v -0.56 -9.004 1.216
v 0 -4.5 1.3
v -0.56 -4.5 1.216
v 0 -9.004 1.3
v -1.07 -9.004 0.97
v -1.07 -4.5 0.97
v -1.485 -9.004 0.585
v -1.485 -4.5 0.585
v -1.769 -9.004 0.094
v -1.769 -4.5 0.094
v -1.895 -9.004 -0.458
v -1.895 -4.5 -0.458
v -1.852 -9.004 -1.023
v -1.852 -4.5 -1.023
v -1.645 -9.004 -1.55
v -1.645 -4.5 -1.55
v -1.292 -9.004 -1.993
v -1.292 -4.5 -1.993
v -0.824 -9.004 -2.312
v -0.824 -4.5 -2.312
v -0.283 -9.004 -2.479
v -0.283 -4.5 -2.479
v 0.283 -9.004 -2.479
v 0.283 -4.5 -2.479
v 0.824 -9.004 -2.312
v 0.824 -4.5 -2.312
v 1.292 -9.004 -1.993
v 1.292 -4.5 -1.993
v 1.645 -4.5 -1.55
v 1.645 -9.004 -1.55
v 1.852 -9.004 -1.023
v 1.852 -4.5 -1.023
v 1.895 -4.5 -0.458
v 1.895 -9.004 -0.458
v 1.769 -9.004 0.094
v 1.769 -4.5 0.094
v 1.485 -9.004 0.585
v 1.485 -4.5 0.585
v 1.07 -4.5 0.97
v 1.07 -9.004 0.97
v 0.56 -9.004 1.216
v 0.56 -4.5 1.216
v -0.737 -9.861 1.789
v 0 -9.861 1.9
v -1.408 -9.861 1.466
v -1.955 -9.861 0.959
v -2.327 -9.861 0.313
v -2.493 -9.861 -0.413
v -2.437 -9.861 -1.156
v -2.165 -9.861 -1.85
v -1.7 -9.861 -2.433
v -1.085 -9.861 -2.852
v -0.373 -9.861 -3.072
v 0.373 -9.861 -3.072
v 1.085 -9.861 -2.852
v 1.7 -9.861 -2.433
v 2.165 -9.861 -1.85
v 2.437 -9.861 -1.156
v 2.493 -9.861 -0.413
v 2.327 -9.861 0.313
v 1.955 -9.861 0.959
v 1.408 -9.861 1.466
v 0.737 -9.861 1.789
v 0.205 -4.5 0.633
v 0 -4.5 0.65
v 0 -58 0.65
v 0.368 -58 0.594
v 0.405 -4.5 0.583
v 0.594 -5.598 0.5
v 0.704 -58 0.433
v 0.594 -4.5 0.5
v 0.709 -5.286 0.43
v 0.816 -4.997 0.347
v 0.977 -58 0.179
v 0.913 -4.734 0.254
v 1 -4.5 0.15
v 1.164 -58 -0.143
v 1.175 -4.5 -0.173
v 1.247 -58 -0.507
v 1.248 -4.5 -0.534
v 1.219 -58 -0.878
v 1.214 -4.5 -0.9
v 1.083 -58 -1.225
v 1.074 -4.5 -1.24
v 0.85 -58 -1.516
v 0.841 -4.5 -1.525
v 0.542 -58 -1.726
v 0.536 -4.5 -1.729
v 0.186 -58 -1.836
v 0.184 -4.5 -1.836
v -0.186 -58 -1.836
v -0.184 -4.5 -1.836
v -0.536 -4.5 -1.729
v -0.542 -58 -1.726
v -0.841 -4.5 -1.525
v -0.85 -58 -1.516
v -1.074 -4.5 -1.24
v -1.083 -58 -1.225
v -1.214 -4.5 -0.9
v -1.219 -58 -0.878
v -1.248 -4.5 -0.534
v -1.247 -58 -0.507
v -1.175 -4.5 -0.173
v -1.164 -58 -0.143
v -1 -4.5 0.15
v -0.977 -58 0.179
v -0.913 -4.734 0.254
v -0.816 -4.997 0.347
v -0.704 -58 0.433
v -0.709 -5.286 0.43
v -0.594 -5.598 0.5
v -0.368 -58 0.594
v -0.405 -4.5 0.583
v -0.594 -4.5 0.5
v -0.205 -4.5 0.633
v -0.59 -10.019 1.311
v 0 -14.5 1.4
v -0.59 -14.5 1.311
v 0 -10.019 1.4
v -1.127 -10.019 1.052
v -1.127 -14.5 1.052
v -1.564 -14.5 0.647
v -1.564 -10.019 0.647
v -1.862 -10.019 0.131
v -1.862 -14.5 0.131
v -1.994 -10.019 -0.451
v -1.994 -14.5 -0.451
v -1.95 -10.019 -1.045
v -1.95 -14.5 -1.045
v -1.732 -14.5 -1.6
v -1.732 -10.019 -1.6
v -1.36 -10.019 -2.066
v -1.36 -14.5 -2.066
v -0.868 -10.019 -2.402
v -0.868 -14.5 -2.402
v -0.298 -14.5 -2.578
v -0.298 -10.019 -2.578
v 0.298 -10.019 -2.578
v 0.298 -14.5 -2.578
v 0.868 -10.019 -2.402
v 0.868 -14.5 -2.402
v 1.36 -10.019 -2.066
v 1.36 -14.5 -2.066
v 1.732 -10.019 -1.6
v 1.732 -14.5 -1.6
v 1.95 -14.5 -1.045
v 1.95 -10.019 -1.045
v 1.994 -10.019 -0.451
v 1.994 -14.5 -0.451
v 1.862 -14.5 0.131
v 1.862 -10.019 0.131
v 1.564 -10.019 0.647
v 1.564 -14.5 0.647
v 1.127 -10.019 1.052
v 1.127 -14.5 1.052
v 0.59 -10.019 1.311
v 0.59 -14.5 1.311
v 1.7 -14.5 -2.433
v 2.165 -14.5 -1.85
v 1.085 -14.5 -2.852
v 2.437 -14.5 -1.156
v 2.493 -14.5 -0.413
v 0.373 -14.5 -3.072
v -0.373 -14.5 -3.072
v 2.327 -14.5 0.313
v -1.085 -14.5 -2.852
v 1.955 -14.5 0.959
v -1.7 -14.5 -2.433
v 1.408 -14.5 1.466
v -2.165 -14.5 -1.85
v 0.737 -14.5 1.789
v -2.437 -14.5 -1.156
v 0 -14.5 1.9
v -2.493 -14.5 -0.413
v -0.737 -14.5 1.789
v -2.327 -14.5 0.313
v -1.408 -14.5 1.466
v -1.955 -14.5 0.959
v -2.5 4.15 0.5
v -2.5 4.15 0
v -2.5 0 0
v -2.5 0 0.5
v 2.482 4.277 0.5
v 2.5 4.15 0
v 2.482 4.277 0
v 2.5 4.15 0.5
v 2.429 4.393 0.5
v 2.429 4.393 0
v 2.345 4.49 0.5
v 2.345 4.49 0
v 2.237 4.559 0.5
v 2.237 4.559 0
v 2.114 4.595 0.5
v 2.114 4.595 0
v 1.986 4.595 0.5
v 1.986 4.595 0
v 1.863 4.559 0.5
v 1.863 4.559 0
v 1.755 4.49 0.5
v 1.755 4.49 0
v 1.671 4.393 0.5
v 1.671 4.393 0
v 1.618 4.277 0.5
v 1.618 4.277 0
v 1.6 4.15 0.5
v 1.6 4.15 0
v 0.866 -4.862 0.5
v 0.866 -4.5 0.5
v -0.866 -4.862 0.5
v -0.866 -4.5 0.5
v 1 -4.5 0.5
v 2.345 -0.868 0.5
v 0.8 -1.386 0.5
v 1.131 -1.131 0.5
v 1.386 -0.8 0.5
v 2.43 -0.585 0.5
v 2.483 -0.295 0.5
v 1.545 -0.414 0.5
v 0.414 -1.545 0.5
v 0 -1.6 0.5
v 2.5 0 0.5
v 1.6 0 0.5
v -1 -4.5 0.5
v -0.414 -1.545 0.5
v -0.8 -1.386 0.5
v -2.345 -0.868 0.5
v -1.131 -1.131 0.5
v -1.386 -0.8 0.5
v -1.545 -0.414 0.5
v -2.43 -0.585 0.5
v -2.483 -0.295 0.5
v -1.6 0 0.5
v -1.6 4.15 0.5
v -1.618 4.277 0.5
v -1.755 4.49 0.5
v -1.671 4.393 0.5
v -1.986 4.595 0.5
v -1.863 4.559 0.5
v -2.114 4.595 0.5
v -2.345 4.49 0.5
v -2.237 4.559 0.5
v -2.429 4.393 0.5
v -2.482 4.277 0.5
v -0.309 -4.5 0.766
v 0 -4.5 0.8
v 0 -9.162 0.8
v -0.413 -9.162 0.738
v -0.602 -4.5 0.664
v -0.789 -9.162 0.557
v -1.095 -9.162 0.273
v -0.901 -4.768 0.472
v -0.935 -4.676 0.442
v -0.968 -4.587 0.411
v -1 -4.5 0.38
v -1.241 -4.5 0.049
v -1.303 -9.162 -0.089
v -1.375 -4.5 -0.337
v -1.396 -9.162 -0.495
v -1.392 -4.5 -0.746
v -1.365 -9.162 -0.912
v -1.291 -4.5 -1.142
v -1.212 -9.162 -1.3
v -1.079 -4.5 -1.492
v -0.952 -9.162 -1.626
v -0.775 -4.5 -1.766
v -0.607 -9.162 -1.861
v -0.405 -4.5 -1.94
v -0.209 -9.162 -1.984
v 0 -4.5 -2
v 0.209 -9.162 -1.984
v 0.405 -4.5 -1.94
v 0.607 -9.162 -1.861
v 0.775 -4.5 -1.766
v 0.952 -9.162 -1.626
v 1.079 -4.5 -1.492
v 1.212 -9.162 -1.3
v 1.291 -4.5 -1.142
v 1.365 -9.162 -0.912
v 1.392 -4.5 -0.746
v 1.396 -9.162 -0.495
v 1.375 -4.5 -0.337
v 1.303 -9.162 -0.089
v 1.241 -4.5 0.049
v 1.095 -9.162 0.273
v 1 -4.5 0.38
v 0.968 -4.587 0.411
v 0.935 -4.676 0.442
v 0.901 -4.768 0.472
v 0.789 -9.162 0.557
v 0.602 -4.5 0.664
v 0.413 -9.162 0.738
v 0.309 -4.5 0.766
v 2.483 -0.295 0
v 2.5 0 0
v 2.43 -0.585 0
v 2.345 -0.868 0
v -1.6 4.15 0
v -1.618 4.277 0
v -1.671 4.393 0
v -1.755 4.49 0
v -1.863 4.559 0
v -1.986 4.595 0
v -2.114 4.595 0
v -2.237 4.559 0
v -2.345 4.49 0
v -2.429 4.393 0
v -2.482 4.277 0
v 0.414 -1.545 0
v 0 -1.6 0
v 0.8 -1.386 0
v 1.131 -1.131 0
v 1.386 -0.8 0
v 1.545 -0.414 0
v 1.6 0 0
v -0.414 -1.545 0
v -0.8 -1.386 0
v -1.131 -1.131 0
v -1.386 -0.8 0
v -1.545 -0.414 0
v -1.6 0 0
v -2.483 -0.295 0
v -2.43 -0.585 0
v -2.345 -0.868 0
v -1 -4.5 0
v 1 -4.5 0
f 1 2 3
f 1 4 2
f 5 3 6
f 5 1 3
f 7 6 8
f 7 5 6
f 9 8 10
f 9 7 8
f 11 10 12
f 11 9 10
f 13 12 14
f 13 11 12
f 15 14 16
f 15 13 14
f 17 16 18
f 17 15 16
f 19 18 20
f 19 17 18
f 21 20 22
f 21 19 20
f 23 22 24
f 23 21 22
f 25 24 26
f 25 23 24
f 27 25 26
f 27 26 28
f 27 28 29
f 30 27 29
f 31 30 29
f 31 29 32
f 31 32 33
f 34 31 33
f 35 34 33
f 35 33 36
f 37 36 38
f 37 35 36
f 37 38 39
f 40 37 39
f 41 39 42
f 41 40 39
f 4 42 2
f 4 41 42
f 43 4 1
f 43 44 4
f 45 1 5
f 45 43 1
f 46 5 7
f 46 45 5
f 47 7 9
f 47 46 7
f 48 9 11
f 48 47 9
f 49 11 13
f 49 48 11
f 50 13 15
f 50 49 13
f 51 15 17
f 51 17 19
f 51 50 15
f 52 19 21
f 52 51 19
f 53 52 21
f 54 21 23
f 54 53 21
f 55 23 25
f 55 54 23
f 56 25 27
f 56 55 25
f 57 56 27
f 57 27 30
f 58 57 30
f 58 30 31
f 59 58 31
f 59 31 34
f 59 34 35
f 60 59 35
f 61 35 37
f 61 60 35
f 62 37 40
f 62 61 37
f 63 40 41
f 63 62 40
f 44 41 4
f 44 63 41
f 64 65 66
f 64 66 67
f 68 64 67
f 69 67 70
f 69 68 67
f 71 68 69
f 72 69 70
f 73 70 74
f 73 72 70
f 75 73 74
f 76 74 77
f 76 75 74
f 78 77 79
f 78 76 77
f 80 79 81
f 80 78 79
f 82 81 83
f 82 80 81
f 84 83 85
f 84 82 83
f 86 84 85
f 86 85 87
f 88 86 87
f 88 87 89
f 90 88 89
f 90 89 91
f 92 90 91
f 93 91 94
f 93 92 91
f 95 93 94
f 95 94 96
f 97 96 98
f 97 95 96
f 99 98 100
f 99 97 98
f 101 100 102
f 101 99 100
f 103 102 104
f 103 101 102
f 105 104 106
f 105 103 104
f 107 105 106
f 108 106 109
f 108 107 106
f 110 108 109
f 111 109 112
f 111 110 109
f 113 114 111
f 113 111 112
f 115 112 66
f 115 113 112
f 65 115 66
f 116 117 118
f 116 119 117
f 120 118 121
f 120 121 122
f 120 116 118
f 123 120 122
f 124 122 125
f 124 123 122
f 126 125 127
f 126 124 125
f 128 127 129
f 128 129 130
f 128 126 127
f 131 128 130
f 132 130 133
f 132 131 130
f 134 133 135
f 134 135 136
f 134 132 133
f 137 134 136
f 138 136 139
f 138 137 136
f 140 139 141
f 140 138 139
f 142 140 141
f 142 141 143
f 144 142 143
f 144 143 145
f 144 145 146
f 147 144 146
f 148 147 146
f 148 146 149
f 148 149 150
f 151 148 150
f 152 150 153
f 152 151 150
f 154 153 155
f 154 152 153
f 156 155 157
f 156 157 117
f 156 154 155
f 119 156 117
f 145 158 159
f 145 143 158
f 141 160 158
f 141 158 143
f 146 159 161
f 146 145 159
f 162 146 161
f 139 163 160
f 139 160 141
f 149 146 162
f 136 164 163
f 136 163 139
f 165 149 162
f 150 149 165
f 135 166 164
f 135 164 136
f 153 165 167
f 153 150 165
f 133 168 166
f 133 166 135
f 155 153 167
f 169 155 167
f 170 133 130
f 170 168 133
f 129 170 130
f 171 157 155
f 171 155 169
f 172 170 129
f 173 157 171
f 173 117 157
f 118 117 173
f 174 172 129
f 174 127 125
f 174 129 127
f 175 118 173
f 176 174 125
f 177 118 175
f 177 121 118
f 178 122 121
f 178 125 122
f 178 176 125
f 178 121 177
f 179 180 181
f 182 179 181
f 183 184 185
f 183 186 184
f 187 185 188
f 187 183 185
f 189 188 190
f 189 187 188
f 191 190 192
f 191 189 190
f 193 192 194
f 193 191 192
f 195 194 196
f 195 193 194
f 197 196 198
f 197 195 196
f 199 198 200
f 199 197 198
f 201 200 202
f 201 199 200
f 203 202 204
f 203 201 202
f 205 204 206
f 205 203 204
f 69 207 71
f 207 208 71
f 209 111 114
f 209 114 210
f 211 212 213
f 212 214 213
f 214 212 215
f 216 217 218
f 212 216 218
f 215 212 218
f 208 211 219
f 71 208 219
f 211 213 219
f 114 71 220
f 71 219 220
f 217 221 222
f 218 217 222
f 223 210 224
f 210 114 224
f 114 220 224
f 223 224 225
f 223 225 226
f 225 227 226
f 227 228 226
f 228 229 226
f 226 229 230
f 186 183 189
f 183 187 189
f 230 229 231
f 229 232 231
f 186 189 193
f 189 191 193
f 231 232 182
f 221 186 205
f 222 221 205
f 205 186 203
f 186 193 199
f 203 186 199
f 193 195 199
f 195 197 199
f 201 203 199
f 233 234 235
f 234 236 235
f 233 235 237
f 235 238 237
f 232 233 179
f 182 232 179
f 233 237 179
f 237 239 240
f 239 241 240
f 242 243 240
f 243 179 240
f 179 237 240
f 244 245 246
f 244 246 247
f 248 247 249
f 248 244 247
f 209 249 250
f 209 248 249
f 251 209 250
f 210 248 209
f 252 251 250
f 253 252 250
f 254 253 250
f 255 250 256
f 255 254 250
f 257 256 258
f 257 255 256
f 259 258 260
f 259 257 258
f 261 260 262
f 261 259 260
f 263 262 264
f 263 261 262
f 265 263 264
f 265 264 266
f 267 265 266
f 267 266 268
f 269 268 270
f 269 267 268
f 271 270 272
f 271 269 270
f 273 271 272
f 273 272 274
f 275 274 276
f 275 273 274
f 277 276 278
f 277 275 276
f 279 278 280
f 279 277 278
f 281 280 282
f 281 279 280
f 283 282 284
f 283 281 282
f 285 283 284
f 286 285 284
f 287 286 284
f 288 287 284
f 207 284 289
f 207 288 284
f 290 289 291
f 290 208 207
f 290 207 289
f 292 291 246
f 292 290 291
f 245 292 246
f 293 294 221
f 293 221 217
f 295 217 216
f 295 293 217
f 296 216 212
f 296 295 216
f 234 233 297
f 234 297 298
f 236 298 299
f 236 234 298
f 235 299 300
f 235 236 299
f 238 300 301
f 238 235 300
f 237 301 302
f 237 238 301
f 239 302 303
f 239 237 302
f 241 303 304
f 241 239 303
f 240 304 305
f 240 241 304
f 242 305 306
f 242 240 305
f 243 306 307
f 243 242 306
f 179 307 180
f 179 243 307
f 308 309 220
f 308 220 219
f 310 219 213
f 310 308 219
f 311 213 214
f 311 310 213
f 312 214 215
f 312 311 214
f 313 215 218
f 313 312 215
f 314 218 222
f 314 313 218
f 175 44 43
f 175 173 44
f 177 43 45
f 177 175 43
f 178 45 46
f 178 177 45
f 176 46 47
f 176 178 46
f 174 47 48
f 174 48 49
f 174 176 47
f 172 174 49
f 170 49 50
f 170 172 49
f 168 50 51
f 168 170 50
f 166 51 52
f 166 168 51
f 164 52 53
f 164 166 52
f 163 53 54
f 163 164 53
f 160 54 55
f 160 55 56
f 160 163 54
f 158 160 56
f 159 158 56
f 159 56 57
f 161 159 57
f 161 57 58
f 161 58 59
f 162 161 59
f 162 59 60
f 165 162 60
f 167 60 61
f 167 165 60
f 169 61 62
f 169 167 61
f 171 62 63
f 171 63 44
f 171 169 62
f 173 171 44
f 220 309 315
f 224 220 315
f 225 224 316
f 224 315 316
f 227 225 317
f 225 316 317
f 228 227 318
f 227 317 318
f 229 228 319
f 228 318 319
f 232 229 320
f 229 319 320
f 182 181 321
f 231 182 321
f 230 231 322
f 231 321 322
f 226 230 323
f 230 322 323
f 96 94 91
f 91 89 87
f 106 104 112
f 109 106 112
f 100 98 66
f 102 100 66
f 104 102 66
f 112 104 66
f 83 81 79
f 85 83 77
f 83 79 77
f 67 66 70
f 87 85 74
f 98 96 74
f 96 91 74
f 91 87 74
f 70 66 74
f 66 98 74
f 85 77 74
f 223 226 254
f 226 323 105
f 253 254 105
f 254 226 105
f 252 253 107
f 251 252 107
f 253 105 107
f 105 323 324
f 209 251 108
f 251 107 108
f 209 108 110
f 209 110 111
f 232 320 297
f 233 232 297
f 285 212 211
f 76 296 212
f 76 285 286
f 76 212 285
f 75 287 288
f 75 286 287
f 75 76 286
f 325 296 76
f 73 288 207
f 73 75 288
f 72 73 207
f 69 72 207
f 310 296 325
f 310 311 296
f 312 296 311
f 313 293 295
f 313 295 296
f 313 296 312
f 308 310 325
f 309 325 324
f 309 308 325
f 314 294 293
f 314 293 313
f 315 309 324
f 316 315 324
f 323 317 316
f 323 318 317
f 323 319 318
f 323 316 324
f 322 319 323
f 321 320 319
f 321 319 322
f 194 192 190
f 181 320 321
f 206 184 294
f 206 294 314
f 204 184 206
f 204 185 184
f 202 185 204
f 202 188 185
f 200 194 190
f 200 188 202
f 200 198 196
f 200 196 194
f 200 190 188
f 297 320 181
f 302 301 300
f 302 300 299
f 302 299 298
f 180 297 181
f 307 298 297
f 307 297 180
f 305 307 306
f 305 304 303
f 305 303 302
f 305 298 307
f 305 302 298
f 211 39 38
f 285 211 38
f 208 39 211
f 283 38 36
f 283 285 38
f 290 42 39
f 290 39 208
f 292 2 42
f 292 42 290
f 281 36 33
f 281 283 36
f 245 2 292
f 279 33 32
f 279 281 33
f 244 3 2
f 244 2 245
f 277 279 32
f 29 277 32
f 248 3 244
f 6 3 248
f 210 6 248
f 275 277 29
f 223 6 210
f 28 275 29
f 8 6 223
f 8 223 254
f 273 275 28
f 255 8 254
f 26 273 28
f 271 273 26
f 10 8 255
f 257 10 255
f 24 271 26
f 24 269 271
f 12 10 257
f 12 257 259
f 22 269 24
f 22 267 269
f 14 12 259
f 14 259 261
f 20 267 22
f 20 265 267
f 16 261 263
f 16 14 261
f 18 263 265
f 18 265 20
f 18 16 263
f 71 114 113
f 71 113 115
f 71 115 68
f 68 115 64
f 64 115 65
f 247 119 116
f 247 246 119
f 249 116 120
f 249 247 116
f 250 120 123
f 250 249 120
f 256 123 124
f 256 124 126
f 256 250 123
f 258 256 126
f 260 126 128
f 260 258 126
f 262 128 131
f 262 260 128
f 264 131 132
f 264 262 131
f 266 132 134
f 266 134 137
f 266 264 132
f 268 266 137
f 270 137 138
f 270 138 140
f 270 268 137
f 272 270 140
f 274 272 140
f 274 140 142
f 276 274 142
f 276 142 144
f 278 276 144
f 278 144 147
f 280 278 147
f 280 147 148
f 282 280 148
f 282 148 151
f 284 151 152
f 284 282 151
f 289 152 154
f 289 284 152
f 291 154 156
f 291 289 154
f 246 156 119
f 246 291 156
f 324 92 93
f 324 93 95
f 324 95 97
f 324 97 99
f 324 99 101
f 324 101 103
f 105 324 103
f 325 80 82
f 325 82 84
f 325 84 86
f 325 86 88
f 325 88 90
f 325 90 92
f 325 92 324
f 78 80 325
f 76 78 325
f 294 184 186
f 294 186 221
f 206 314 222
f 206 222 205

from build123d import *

# Parameters (mm, degrees)
EXTRUDE_1_DEPTH               = 0.5
FILLET_1_RADIUS               = 0.45
FILLET_1_LENGTH               = 0.5
CHAMFER_1_SIZE                = 0.5
FILLET_1_OF_MIRROR_1_2_RADIUS = 0.45
FILLET_1_OF_MIRROR_1_2_LENGTH = 0.5
CHAMFER_1_OF_MIRROR_1_SIZE    = 0.5
SKETCH_5_R                    = 1.25
EXTRUDE_2_DEPTH               = 53.5


with BuildPart() as part:
    # 草图1 → 凸台-拉伸1 (new body)
    with BuildSketch(Plane.XY):
        with BuildLine():
            Line((-2.344520595, -0.867884312), (-1, -4.5))
            Line((-1, -4.5), (-1, -14.5))
            Line((-1, -14.5), (0, -14.5))
            Line((0, -14.5), (0, -1.6))
            ThreePointArc((0, -1.6), (-1.13137085, -1.13137085), (-1.6, 0))
            Line((-1.6, 0), (-1.6, 4.6))
            Line((-1.6, 4.6), (-2.5, 4.6))
            Line((-2.5, 4.6), (-2.5, 0))
            ThreePointArc((-2.5, 0), (-2.460823184, -0.440850605), (-2.344520595, -0.867884312))
        make_face()
    extrude_1 = extrude(amount=EXTRUDE_1_DEPTH)

    # 圆角1: full round fillet: the end face becomes a half cylinder, R = half its width
    fillet_1_face = Plane((-2.05, 4.6, 0.25), x_dir=(0, 0, 1), z_dir=(0, 1, 0))  # on the end face: x along it, z out of the body
    fillet_1_slab = fillet_1_face.offset(-FILLET_1_RADIUS / 2) * Box(FILLET_1_LENGTH, 2 * FILLET_1_RADIUS, FILLET_1_RADIUS, mode=Mode.PRIVATE)  # the body's end, R deep
    fillet_1_round = Plane((-2.05, 4.15, 0.25), x_dir=(0, 1, 0), z_dir=(0, 0, 1)) * Cylinder(FILLET_1_RADIUS, FILLET_1_LENGTH, mode=Mode.PRIVATE)  # its axis R under the face
    add(fillet_1_slab - fillet_1_round, mode=Mode.SUBTRACT)

    # 倒角1
    chamfer_1_edges = [part.edges().sort_by_distance(p)[0] for p in [
        (-1, -9.5, 0.5),
    ]]
    chamfer(chamfer_1_edges, length=CHAMFER_1_SIZE - 0.0001)  # a hair under: the kernel refuses the full size

    # 镜向1: 凸台-拉伸1 across Right Plane
    add(extrude_1.mirror(Plane(origin=(0, 0, 0), x_dir=(0, 0, -1), z_dir=(1, 0, 0))))

    # 圆角1 of Mirror 1 2: full round fillet: the end face becomes a half cylinder, R = half its width
    fillet_1_of_mirror_1_2_face = Plane((2.05, 4.6, 0.25), x_dir=(0, 0, 1), z_dir=(0, 1, 0))  # on the end face: x along it, z out of the body
    fillet_1_of_mirror_1_2_slab = fillet_1_of_mirror_1_2_face.offset(-FILLET_1_OF_MIRROR_1_2_RADIUS / 2) * Box(FILLET_1_OF_MIRROR_1_2_LENGTH, 2 * FILLET_1_OF_MIRROR_1_2_RADIUS, FILLET_1_OF_MIRROR_1_2_RADIUS, mode=Mode.PRIVATE)  # the body's end, R deep
    fillet_1_of_mirror_1_2_round = Plane((2.05, 4.15, 0.25), x_dir=(0, 1, 0), z_dir=(0, 0, 1)) * Cylinder(FILLET_1_OF_MIRROR_1_2_RADIUS, FILLET_1_OF_MIRROR_1_2_LENGTH, mode=Mode.PRIVATE)  # its axis R under the face
    add(fillet_1_of_mirror_1_2_slab - fillet_1_of_mirror_1_2_round, mode=Mode.SUBTRACT)

    # 倒角1 of 镜向1
    chamfer_1_of_mirror_1_edges = [part.edges().sort_by_distance(p)[0] for p in [
        (1, -9.5, 0.5),
    ]]
    chamfer(chamfer_1_of_mirror_1_edges, length=CHAMFER_1_OF_MIRROR_1_SIZE - 0.0001)  # a hair under: the kernel refuses the full size

    # 草图3 → 旋转1 (revolve)
    with BuildSketch(Plane(origin=(0, 0, 0), x_dir=(0, 0, -1), z_dir=(1, 0, 0)), mode=Mode.PRIVATE) as revolve_1_sk:
        Polygon((2.5, -4.5), (2.5, -9.004043198), (3.1, -9.860932002), (3.1, -14.5), (2.6, -14.5), (2.6, -10.018581397), (2, -9.161692593), (2, -4.5), align=None)
    revolve(revolve_1_sk.sketch.rotate(Axis((0, -5.567856156, -0.6), (0, -1, 0)), 180), axis=Axis((0, -5.567856156, -0.6), (0, -1, 0)))

    # 草图5 → 凸台-拉伸2 (add)
    with BuildSketch(Plane(origin=(0, -4.5, 0), x_dir=(1, 0, 0), z_dir=(0, 1, 0))):
        with Locations(Location((0, 0.6, 0), (0, 0, 270))):
            Circle(SKETCH_5_R)
    extrude(amount=-EXTRUDE_2_DEPTH)


solid = part.part
